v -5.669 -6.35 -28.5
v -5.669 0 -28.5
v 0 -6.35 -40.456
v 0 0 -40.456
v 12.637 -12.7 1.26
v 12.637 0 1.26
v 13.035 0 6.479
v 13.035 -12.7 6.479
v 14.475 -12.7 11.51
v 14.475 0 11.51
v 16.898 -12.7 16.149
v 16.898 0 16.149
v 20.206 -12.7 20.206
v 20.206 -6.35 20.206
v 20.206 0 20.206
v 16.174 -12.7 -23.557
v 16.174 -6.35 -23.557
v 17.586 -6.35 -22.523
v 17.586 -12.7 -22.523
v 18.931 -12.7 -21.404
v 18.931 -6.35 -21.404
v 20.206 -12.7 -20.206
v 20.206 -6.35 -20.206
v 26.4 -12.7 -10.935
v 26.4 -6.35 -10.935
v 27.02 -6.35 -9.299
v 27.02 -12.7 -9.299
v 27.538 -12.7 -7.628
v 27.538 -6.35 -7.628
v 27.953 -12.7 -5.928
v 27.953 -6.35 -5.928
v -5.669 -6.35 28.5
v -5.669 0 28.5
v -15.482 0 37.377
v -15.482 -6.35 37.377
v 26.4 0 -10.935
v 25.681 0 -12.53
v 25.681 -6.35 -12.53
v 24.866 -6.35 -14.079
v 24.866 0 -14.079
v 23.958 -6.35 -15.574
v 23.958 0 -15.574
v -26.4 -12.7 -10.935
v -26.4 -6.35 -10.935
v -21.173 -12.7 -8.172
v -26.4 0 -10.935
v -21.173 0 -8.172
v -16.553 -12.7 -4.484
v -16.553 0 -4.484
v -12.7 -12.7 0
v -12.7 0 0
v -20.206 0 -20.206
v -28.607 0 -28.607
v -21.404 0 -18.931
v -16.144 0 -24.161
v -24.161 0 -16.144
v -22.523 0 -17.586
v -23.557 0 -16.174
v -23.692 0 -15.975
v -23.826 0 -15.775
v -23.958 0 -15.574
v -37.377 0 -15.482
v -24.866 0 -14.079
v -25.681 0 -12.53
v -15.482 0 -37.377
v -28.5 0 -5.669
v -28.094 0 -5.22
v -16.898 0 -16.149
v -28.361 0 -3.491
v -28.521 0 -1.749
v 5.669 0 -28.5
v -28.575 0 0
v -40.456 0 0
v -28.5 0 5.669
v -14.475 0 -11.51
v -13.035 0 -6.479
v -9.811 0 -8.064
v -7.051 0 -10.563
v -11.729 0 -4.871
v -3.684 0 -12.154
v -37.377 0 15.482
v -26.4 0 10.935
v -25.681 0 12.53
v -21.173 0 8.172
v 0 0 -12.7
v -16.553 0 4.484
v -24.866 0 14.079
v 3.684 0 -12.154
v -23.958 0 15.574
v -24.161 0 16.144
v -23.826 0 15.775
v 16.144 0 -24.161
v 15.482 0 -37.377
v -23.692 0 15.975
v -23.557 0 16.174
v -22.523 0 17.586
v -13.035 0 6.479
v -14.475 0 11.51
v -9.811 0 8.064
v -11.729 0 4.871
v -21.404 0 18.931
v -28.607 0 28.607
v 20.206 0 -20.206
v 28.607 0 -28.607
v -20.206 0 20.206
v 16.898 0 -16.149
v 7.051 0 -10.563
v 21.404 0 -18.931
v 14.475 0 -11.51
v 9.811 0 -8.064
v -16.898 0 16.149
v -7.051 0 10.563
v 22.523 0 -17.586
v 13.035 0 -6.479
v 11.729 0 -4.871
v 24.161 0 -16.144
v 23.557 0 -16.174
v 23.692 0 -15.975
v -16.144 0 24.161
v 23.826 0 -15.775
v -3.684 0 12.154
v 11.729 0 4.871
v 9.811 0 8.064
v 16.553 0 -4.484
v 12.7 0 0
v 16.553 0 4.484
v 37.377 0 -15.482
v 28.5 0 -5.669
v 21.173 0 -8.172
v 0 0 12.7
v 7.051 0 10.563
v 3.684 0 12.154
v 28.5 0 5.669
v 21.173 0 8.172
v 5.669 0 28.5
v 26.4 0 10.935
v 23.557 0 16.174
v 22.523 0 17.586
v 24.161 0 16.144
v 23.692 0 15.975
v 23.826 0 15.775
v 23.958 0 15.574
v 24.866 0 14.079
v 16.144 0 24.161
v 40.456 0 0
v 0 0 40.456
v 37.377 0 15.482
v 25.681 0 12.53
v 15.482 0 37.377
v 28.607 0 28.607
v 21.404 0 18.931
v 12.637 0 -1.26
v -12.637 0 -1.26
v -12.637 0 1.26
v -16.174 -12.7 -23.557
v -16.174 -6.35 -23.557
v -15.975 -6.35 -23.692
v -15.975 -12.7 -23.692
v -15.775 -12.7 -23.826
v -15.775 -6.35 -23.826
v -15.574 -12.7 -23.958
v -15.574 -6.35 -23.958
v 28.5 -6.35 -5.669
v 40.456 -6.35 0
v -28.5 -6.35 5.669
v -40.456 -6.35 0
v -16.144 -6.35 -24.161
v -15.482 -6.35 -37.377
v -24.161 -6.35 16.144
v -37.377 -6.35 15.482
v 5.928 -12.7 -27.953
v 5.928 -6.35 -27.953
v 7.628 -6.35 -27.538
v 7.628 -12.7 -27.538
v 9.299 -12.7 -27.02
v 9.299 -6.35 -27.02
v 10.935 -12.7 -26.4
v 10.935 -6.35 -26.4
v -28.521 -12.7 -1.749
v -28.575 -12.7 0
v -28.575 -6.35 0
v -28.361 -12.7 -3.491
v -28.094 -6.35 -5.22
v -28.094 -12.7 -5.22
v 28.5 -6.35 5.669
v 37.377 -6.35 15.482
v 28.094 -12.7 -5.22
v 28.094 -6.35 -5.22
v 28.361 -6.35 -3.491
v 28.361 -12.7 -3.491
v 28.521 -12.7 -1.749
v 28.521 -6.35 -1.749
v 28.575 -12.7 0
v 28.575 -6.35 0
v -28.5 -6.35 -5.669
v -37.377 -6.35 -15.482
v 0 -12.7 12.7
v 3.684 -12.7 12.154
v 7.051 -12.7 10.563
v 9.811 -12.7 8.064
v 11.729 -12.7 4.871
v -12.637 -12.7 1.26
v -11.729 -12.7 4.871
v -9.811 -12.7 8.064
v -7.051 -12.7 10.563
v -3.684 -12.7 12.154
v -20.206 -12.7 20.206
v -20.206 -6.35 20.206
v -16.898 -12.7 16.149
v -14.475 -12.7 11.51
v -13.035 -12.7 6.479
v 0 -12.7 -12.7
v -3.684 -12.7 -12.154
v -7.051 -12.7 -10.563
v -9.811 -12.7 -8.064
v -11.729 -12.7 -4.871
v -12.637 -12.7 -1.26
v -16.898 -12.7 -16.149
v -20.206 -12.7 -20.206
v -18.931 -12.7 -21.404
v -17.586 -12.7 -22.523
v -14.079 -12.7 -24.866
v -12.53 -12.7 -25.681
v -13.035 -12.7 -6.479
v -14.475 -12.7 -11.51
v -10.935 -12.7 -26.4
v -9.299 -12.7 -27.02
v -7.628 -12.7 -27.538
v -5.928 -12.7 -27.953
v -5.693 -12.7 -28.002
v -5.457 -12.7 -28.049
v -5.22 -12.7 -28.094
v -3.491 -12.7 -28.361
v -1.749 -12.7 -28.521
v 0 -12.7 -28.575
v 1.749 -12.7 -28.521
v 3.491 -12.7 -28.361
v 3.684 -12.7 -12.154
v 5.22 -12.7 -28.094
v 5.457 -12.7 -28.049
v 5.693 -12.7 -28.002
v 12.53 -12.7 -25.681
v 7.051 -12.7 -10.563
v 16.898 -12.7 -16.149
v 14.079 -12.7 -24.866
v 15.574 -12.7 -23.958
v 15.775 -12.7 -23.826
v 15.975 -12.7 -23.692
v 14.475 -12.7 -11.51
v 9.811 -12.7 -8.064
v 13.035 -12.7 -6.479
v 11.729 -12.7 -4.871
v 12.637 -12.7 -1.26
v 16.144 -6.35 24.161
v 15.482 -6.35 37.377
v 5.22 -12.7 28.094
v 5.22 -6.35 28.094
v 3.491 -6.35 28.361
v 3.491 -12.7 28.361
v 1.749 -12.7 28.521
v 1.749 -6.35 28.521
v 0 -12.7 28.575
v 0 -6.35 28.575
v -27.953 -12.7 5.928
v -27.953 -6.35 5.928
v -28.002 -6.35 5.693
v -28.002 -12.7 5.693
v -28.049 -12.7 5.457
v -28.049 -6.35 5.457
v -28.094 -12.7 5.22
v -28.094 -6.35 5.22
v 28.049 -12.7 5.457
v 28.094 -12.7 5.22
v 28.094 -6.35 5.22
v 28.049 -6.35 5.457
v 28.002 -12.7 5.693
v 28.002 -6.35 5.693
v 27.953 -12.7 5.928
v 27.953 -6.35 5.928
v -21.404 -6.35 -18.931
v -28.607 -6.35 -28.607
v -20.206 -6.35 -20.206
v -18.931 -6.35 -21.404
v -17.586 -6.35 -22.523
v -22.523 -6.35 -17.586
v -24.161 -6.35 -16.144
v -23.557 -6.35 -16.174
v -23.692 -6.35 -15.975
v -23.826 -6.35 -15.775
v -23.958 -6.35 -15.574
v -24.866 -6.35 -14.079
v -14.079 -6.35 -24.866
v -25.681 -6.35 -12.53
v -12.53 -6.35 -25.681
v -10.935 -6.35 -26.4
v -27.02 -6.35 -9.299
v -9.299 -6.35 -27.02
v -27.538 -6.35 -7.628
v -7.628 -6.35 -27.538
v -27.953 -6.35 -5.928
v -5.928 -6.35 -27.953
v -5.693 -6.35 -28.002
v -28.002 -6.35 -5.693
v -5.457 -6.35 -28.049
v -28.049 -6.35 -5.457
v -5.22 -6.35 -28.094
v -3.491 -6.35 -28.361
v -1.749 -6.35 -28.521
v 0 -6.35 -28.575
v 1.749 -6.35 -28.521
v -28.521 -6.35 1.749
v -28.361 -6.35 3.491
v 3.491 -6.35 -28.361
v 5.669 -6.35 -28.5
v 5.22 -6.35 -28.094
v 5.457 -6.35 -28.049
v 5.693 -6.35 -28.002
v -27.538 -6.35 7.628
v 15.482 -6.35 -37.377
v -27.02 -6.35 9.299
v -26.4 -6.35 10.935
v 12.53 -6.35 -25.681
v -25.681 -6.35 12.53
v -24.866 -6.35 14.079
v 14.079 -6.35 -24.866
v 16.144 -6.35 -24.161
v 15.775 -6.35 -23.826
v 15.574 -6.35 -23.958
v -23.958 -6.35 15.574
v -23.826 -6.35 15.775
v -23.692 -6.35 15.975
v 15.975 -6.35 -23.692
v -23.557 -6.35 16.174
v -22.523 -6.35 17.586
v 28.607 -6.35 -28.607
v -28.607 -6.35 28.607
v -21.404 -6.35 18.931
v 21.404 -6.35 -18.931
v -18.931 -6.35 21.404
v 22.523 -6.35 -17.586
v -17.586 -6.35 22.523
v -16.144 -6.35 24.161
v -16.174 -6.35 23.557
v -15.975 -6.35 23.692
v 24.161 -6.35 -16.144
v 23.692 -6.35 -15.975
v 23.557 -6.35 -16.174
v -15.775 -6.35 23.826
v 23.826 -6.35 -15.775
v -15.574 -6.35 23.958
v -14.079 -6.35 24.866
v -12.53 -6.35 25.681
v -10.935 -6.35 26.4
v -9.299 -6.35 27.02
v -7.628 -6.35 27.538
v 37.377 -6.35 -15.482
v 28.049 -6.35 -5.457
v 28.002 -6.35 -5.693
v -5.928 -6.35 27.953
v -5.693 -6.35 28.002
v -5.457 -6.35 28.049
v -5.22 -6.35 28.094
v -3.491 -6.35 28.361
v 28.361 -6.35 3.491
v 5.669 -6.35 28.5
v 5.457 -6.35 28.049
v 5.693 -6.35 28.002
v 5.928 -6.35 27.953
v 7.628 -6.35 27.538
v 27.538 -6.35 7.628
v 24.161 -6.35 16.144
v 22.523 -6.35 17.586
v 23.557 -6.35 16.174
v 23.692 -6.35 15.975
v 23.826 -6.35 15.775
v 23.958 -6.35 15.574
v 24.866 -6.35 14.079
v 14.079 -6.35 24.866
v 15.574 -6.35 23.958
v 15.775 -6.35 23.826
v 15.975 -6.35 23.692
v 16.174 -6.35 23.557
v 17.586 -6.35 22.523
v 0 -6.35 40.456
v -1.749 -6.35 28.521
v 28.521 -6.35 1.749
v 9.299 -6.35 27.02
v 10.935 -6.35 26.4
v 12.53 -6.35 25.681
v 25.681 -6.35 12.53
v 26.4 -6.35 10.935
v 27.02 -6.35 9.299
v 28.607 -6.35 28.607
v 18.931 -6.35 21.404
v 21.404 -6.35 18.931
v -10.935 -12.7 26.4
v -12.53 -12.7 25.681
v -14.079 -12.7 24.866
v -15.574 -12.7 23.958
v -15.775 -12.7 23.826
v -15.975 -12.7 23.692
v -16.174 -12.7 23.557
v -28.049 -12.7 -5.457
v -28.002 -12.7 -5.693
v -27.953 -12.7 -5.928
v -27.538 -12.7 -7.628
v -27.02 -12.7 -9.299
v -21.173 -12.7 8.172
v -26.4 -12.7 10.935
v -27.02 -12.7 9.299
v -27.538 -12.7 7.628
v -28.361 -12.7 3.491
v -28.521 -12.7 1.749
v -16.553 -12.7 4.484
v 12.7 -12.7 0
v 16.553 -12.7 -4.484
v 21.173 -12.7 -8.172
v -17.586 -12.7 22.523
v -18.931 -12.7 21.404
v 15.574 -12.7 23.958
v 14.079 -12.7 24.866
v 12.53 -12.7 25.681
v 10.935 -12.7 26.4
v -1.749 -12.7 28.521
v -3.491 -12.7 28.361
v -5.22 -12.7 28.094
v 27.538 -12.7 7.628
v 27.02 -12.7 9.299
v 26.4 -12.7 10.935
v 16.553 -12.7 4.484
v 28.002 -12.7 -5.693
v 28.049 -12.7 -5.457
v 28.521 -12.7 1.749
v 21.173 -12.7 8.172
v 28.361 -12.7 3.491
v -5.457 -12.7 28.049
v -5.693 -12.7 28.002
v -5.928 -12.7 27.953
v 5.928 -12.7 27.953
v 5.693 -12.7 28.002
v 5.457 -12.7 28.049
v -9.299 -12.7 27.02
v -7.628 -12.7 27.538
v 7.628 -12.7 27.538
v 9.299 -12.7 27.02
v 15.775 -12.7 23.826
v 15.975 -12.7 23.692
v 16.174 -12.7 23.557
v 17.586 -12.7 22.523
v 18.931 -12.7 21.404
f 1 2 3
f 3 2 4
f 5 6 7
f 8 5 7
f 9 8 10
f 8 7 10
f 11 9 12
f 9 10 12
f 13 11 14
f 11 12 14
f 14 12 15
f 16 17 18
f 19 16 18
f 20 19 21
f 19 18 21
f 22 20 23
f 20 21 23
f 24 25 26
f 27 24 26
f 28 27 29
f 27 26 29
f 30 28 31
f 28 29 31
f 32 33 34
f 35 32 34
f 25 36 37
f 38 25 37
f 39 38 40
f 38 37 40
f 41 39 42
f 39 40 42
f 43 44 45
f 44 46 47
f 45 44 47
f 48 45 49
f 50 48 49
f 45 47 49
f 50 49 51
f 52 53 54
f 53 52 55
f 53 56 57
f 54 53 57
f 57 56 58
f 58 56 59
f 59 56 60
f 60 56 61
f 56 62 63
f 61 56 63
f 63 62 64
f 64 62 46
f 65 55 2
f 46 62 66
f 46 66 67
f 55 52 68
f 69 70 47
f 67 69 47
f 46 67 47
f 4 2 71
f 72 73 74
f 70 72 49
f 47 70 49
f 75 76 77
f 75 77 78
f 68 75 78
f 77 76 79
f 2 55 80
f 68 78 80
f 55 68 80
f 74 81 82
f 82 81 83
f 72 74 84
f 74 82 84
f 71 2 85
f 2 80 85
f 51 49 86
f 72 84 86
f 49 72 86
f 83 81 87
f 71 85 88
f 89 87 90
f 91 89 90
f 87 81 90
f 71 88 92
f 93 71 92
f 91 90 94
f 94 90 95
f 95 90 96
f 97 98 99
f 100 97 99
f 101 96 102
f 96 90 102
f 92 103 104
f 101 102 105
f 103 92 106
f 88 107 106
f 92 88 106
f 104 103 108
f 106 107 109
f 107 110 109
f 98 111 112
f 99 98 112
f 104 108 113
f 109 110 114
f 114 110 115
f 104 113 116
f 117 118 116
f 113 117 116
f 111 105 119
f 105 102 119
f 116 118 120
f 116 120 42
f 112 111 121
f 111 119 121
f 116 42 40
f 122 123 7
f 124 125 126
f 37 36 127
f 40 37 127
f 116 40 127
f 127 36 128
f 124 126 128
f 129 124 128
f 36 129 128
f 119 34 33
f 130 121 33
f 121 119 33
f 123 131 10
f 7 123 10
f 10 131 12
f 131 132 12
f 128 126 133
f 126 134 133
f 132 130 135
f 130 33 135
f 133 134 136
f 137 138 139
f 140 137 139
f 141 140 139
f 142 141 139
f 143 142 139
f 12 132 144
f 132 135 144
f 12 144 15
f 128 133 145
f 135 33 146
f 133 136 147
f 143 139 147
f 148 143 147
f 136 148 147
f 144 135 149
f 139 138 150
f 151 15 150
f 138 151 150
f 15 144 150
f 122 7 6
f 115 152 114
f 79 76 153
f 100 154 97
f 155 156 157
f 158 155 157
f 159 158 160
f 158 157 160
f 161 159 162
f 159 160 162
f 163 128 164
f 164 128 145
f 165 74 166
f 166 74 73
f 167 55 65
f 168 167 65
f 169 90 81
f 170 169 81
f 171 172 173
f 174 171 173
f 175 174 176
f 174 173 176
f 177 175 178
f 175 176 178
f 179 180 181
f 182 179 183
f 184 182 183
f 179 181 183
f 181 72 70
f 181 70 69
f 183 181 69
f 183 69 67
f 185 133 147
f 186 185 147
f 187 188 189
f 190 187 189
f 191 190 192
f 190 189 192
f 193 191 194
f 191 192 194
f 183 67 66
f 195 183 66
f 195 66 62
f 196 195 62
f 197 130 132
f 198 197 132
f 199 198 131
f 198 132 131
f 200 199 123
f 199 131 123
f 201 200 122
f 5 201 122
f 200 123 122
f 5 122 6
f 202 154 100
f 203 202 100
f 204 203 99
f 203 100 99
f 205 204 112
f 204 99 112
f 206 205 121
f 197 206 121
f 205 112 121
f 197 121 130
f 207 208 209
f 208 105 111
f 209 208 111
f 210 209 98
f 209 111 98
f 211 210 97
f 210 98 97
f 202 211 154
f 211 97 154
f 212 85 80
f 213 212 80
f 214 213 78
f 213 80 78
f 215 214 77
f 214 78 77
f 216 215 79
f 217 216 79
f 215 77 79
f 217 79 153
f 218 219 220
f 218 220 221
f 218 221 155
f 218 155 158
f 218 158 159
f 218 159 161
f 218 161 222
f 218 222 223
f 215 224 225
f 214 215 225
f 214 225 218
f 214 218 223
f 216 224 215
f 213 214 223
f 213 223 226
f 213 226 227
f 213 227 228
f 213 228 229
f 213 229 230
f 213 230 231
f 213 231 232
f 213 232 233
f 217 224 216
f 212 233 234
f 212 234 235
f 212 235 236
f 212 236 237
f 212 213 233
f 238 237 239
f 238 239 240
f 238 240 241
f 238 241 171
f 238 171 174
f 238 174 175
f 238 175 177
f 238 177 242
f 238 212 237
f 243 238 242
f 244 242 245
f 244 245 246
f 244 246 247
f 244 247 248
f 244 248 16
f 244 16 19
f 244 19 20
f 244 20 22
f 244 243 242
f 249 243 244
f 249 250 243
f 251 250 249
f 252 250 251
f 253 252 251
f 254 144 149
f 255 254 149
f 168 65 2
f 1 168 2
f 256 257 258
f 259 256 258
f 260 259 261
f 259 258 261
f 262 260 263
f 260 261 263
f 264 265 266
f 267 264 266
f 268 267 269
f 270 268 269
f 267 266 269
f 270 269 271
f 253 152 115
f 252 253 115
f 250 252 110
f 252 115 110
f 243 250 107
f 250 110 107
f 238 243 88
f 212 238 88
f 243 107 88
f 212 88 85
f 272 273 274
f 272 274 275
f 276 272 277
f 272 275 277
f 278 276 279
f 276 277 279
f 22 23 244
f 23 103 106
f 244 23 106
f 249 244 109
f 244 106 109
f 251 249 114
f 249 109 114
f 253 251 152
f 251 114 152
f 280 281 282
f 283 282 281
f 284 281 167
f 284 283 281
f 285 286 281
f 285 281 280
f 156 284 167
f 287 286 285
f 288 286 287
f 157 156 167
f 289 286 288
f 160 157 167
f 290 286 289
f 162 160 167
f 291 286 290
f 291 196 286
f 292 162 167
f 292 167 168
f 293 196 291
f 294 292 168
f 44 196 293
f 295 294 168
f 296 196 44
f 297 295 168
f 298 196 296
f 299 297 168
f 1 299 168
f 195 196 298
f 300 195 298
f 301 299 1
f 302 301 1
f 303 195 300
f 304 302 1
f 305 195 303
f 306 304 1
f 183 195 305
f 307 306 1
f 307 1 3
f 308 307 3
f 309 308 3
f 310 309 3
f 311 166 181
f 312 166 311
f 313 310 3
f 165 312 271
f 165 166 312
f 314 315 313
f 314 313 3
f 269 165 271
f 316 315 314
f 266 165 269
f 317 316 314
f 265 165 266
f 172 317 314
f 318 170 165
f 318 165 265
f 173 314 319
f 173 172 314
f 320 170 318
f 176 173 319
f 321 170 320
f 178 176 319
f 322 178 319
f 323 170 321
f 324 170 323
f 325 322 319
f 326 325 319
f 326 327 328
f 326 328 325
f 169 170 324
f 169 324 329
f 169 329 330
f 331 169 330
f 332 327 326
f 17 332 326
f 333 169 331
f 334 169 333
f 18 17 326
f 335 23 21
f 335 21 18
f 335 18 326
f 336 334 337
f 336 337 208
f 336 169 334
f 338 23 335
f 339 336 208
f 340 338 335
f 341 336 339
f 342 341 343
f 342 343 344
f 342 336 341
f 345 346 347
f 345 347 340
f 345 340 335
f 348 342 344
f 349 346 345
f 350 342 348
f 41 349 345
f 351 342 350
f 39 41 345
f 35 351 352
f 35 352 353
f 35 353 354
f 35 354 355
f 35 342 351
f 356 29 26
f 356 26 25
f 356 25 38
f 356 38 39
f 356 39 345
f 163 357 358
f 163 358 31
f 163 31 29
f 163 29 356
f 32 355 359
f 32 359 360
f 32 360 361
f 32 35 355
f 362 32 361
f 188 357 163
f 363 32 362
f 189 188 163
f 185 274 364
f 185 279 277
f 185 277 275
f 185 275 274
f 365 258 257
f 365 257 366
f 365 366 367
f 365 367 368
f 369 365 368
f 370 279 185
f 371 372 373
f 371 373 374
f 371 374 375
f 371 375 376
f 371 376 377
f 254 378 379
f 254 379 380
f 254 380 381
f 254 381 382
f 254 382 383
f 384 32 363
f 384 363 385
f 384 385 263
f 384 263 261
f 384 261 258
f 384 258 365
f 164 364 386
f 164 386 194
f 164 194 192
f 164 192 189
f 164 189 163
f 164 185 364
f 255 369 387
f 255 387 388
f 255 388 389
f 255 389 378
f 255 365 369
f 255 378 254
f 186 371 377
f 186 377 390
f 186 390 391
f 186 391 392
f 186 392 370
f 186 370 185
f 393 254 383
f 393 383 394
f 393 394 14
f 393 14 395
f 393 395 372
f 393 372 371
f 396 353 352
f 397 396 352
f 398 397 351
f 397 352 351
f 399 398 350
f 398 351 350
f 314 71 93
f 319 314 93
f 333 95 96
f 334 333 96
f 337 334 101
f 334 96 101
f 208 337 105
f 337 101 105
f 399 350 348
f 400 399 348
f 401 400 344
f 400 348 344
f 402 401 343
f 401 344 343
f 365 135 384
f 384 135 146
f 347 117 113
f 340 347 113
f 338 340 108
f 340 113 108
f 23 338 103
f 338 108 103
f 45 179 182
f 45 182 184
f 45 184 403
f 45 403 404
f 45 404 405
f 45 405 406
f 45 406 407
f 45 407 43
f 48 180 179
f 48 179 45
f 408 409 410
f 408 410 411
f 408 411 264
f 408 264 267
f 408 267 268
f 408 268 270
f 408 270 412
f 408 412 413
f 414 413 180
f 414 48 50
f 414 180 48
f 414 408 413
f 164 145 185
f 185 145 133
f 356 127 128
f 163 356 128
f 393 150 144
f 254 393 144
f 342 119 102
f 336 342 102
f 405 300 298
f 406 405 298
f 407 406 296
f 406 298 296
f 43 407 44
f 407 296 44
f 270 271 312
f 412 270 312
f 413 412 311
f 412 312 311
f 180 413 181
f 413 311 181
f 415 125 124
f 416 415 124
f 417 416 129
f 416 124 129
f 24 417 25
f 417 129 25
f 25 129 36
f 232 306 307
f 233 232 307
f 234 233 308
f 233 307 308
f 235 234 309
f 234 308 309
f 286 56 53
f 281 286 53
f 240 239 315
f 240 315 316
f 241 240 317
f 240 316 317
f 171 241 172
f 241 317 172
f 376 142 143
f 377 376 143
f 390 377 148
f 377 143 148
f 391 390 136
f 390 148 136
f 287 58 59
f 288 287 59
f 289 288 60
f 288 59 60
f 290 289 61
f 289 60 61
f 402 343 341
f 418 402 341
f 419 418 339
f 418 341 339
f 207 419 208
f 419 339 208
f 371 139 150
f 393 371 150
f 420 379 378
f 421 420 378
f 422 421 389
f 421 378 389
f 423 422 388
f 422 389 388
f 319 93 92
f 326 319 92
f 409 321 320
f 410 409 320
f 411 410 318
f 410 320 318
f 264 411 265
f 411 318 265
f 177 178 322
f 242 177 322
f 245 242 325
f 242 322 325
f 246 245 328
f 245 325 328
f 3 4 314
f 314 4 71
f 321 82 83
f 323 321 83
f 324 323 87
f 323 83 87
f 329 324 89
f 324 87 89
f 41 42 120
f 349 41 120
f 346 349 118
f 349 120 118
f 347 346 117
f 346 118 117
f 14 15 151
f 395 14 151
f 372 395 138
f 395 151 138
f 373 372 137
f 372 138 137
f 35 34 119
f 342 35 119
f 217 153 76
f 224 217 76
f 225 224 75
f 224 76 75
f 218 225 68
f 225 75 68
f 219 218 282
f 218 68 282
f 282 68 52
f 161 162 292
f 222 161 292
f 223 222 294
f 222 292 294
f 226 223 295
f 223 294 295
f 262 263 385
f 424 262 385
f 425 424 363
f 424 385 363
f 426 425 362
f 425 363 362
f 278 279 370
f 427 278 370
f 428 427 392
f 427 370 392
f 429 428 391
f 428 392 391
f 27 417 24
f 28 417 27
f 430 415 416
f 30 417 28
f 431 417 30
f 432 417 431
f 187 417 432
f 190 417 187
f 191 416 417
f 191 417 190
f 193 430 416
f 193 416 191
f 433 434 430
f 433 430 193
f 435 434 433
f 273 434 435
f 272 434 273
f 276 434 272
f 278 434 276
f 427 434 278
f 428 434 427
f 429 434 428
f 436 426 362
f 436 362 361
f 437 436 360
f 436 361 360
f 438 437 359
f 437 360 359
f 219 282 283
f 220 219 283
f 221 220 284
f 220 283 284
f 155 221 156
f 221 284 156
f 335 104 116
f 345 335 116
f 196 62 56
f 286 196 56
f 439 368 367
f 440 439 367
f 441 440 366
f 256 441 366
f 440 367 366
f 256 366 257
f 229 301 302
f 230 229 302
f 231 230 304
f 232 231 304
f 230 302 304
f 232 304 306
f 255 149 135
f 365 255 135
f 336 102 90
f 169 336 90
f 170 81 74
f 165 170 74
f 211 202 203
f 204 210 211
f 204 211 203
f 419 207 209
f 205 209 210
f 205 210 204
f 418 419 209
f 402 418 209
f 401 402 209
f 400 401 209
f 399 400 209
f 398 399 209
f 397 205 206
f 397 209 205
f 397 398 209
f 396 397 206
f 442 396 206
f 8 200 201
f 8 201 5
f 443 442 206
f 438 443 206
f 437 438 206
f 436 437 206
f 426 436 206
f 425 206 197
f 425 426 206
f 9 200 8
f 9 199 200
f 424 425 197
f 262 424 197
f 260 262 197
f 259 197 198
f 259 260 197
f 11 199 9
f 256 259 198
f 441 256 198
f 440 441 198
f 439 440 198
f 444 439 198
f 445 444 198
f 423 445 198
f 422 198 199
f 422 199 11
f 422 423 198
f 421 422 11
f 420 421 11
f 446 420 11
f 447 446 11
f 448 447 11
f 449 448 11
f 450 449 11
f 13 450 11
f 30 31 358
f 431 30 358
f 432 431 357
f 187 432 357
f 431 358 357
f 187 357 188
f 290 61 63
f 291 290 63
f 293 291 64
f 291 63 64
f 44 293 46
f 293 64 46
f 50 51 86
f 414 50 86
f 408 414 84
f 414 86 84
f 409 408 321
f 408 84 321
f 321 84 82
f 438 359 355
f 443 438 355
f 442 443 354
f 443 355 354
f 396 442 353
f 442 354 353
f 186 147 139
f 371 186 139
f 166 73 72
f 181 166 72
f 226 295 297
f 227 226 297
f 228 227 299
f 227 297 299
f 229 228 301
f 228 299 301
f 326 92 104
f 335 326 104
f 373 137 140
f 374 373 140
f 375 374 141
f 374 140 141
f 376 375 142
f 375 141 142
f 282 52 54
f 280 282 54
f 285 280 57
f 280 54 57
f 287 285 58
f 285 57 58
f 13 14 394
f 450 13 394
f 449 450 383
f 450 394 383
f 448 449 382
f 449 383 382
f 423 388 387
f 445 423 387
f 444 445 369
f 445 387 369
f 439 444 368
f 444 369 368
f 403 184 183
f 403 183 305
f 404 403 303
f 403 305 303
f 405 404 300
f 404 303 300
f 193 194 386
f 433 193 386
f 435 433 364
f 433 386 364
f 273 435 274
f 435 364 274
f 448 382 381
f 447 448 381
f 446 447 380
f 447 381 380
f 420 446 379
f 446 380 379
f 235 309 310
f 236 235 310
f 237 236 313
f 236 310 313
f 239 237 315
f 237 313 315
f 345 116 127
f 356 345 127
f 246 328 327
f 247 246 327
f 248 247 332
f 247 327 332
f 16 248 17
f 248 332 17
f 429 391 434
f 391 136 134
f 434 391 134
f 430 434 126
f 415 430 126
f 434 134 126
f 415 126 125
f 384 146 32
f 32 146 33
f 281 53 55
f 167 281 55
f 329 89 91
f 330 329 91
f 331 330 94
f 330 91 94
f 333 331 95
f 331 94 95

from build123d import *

# Parameters (mm, degrees)
F1_DEPTH = 6.35
F2_DEPTH = 12.7


with BuildPart() as f1:
    # F0 (on Front) → F1 (new body)
    with BuildSketch(Plane.XZ):
        with BuildLine():
            ThreePointArc((28.0940846779, 5.220443574), (28.4545171693, 2.6212740536), (28.575, 0))
            Line((28.575, 0), (40.4561832547, 0))
            Line((40.4561832547, 0), (28.4998200535, 5.6689666767))
            Line((28.4998200535, 5.6689666767), (28.0940846779, 5.220443574))
        make_face()
        with BuildLine():
            ThreePointArc((27.9533270839, 5.9280797851), (28.0259393875, 5.5747059516), (28.0940846779, 5.220443574))
            Line((28.0940846779, 5.220443574), (28.4998200535, 5.6689666767))
            Line((28.4998200535, 5.6689666767), (27.9533270839, 5.9280797851))
        make_face()
        with BuildLine():
            Line((37.3766396726, 15.4819110683), (26.3998576415, 10.9351790798))
            ThreePointArc((26.3998576415, 10.9351790798), (27.2916641722, 8.4673308494), (27.9533270839, 5.9280797851))
            Line((27.9533270839, 5.9280797851), (28.4998200535, 5.6689666767))
            Line((28.4998200535, 5.6689666767), (37.3766396726, 15.4819110683))
        make_face()
        with BuildLine():
            ThreePointArc((23.9577725532, 15.5742017223), (25.2854278682, 13.3108137438), (26.3998576415, 10.9351790798))
            Line((26.3998576415, 10.9351790798), (37.3766396726, 15.4819110683))
            Line((37.3766396726, 15.4819110683), (24.1609808019, 16.143851243))
            Line((24.1609808019, 16.143851243), (23.9577725532, 15.5742017223))
        make_face()
        with BuildLine():
            ThreePointArc((23.556928839, 16.174106735), (23.7592441715, 15.8754194085), (23.9577725532, 15.5742017223))
            Line((23.9577725532, 15.5742017223), (24.1609808019, 16.143851243))
            Line((24.1609808019, 16.143851243), (23.556928839, 16.174106735))
        make_face()
        with BuildLine():
            Line((28.6068415203, 28.6068415203), (20.2055762724, 20.2055762724))
            ThreePointArc((20.2055762724, 20.2055762724), (21.9739027044, 18.2668613871), (23.556928839, 16.174106735))
            Line((23.556928839, 16.174106735), (24.1609808019, 16.143851243))
            Line((24.1609808019, 16.143851243), (28.6068415203, 28.6068415203))
        make_face()
        with BuildLine():
            ThreePointArc((16.174106735, 23.556928839), (18.2668613871, 21.9739027044), (20.2055762724, 20.2055762724))
            Line((20.2055762724, 20.2055762724), (28.6068415203, 28.6068415203))
            Line((28.6068415203, 28.6068415203), (16.143851243, 24.1609808019))
            Line((16.143851243, 24.1609808019), (16.174106735, 23.556928839))
        make_face()
        with BuildLine():
            ThreePointArc((15.5742017223, 23.9577725532), (15.8754194085, 23.7592441715), (16.174106735, 23.556928839))
            Line((16.174106735, 23.556928839), (16.143851243, 24.1609808019))
            Line((16.143851243, 24.1609808019), (15.5742017223, 23.9577725532))
        make_face()
        with BuildLine():
            ThreePointArc((10.9351790798, 26.3998576415), (13.3108137438, 25.2854278682), (15.5742017223, 23.9577725532))
            Line((15.5742017223, 23.9577725532), (16.143851243, 24.1609808019))
            Line((16.143851243, 24.1609808019), (15.4819110683, 37.3766396726))
            Line((15.4819110683, 37.3766396726), (10.9351790798, 26.3998576415))
        make_face()
        with BuildLine():
            Line((5.6689666767, 28.4998200535), (5.9280797851, 27.9533270839))
            ThreePointArc((5.9280797851, 27.9533270839), (8.4673308494, 27.2916641722), (10.9351790798, 26.3998576415))
            Line((10.9351790798, 26.3998576415), (15.4819110683, 37.3766396726))
            Line((15.4819110683, 37.3766396726), (5.6689666767, 28.4998200535))
        make_face()
        with BuildLine():
            Line((5.6689666767, 28.4998200535), (5.220443574, 28.0940846779))
            ThreePointArc((5.220443574, 28.0940846779), (5.5747059516, 28.0259393875), (5.9280797851, 27.9533270839))
            Line((5.9280797851, 27.9533270839), (5.6689666767, 28.4998200535))
        make_face()
        with BuildLine():
            Line((0, 40.4561832547), (0, 28.575))
            ThreePointArc((0, 28.575), (2.6212740536, 28.4545171693), (5.220443574, 28.0940846779))
            Line((5.220443574, 28.0940846779), (5.6689666767, 28.4998200535))
            Line((5.6689666767, 28.4998200535), (0, 40.4561832547))
        make_face()
        with BuildLine():
            ThreePointArc((-5.220443574, 28.0940846779), (-2.6212740536, 28.4545171693), (0, 28.575))
            Line((0, 28.575), (0, 40.4561832547))
            Line((0, 40.4561832547), (-5.6689666767, 28.4998200535))
            Line((-5.6689666767, 28.4998200535), (-5.220443574, 28.0940846779))
        make_face()
        with BuildLine():
            ThreePointArc((-5.9280797851, 27.9533270839), (-5.5747059516, 28.0259393875), (-5.220443574, 28.0940846779))
            Line((-5.220443574, 28.0940846779), (-5.6689666767, 28.4998200535))
            Line((-5.6689666767, 28.4998200535), (-5.9280797851, 27.9533270839))
        make_face()
        with BuildLine():
            ThreePointArc((-10.9351790798, 26.3998576415), (-8.4673308494, 27.2916641722), (-5.9280797851, 27.9533270839))
            Line((-5.9280797851, 27.9533270839), (-5.6689666767, 28.4998200535))
            Line((-5.6689666767, 28.4998200535), (-15.4819110683, 37.3766396726))
            Line((-15.4819110683, 37.3766396726), (-10.9351790798, 26.3998576415))
        make_face()
        with BuildLine():
            Line((-16.143851243, 24.1609808019), (-15.5742017223, 23.9577725532))
            ThreePointArc((-15.5742017223, 23.9577725532), (-13.3108137438, 25.2854278682), (-10.9351790798, 26.3998576415))
            Line((-10.9351790798, 26.3998576415), (-15.4819110683, 37.3766396726))
            Line((-15.4819110683, 37.3766396726), (-16.143851243, 24.1609808019))
        make_face()
        with BuildLine():
            Line((-16.143851243, 24.1609808019), (-16.174106735, 23.556928839))
            ThreePointArc((-16.174106735, 23.556928839), (-15.8754194085, 23.7592441715), (-15.5742017223, 23.9577725532))
            Line((-15.5742017223, 23.9577725532), (-16.143851243, 24.1609808019))
        make_face()
        with BuildLine():
            Line((-28.6068415203, 28.6068415203), (-20.2055762724, 20.2055762724))
            ThreePointArc((-20.2055762724, 20.2055762724), (-18.2668613871, 21.9739027044), (-16.174106735, 23.556928839))
            Line((-16.174106735, 23.556928839), (-16.143851243, 24.1609808019))
            Line((-16.143851243, 24.1609808019), (-28.6068415203, 28.6068415203))
        make_face()
        with BuildLine():
            ThreePointArc((-23.556928839, 16.174106735), (-21.9739027044, 18.2668613871), (-20.2055762724, 20.2055762724))
            Line((-20.2055762724, 20.2055762724), (-28.6068415203, 28.6068415203))
            Line((-28.6068415203, 28.6068415203), (-24.1609808019, 16.143851243))
            Line((-24.1609808019, 16.143851243), (-23.556928839, 16.174106735))
        make_face()
        with BuildLine():
            ThreePointArc((-23.9577725532, 15.5742017223), (-23.7592441715, 15.8754194085), (-23.556928839, 16.174106735))
            Line((-23.556928839, 16.174106735), (-24.1609808019, 16.143851243))
            Line((-24.1609808019, 16.143851243), (-23.9577725532, 15.5742017223))
        make_face()
        with BuildLine():
            Line((-37.3766396726, 15.4819110683), (-26.3998576415, 10.9351790798))
            ThreePointArc((-26.3998576415, 10.9351790798), (-25.2854278682, 13.3108137438), (-23.9577725532, 15.5742017223))
            Line((-23.9577725532, 15.5742017223), (-24.1609808019, 16.143851243))
            Line((-24.1609808019, 16.143851243), (-37.3766396726, 15.4819110683))
        make_face()
        with BuildLine():
            ThreePointArc((-27.9533270839, 5.9280797851), (-27.2916641722, 8.4673308494), (-26.3998576415, 10.9351790798))
            Line((-26.3998576415, 10.9351790798), (-37.3766396726, 15.4819110683))
            Line((-37.3766396726, 15.4819110683), (-28.4998200535, 5.6689666767))
            Line((-28.4998200535, 5.6689666767), (-27.9533270839, 5.9280797851))
        make_face()
        with BuildLine():
            Line((-28.4998200535, 5.6689666767), (-28.0940846779, 5.220443574))
            ThreePointArc((-28.0940846779, 5.220443574), (-28.0259393875, 5.5747059516), (-27.9533270839, 5.9280797851))
            Line((-27.9533270839, 5.9280797851), (-28.4998200535, 5.6689666767))
        make_face()
        with BuildLine():
            Line((-40.4561832547, 0), (-28.575, 0))
            ThreePointArc((-28.575, 0), (-28.4545171693, 2.6212740536), (-28.0940846779, 5.220443574))
            Line((-28.0940846779, 5.220443574), (-28.4998200535, 5.6689666767))
            Line((-28.4998200535, 5.6689666767), (-40.4561832547, 0))
        make_face()
        with BuildLine():
            ThreePointArc((-27.9533270839, -5.9280797851), (-28.0259393875, -5.5747059516), (-28.0940846779, -5.220443574))
            Line((-28.0940846779, -5.220443574), (-28.4998200535, -5.6689666767))
            Line((-28.4998200535, -5.6689666767), (-27.9533270839, -5.9280797851))
        make_face()
        with BuildLine():
            Line((-37.3766396726, -15.4819110683), (-26.3998576415, -10.9351790798))
            ThreePointArc((-26.3998576415, -10.9351790798), (-27.2916641722, -8.4673308494), (-27.9533270839, -5.9280797851))
            Line((-27.9533270839, -5.9280797851), (-28.4998200535, -5.6689666767))
            Line((-28.4998200535, -5.6689666767), (-37.3766396726, -15.4819110683))
        make_face()
        with BuildLine():
            ThreePointArc((-23.9577725532, -15.5742017223), (-25.2854278682, -13.3108137438), (-26.3998576415, -10.9351790798))
            Line((-26.3998576415, -10.9351790798), (-37.3766396726, -15.4819110683))
            Line((-37.3766396726, -15.4819110683), (-24.1609808019, -16.143851243))
            Line((-24.1609808019, -16.143851243), (-23.9577725532, -15.5742017223))
        make_face()
        with BuildLine():
            Line((-24.1609808019, -16.143851243), (-23.556928839, -16.174106735))
            ThreePointArc((-23.556928839, -16.174106735), (-23.7592441715, -15.8754194085), (-23.9577725532, -15.5742017223))
            Line((-23.9577725532, -15.5742017223), (-24.1609808019, -16.143851243))
        make_face()
        with BuildLine():
            Line((-28.6068415203, -28.6068415203), (-20.2055762724, -20.2055762724))
            ThreePointArc((-20.2055762724, -20.2055762724), (-21.9739027044, -18.2668613871), (-23.556928839, -16.174106735))
            Line((-23.556928839, -16.174106735), (-24.1609808019, -16.143851243))
            Line((-24.1609808019, -16.143851243), (-28.6068415203, -28.6068415203))
        make_face()
        with BuildLine():
            ThreePointArc((-16.174106735, -23.556928839), (-18.2668613871, -21.9739027044), (-20.2055762724, -20.2055762724))
            Line((-20.2055762724, -20.2055762724), (-28.6068415203, -28.6068415203))
            Line((-28.6068415203, -28.6068415203), (-16.143851243, -24.1609808019))
            Line((-16.143851243, -24.1609808019), (-16.174106735, -23.556928839))
        make_face()
        with BuildLine():
            ThreePointArc((-15.5742017223, -23.9577725532), (-15.8754194085, -23.7592441715), (-16.174106735, -23.556928839))
            Line((-16.174106735, -23.556928839), (-16.143851243, -24.1609808019))
            Line((-16.143851243, -24.1609808019), (-15.5742017223, -23.9577725532))
        make_face()
        with BuildLine():
            ThreePointArc((-10.9351790798, -26.3998576415), (-13.3108137438, -25.2854278682), (-15.5742017223, -23.9577725532))
            Line((-15.5742017223, -23.9577725532), (-16.143851243, -24.1609808019))
            Line((-16.143851243, -24.1609808019), (-15.4819110683, -37.3766396726))
            Line((-15.4819110683, -37.3766396726), (-10.9351790798, -26.3998576415))
        make_face()
        with BuildLine():
            Line((-5.6689666767, -28.4998200535), (-5.9280797851, -27.9533270839))
            ThreePointArc((-5.9280797851, -27.9533270839), (-8.4673308494, -27.2916641722), (-10.9351790798, -26.3998576415))
            Line((-10.9351790798, -26.3998576415), (-15.4819110683, -37.3766396726))
            Line((-15.4819110683, -37.3766396726), (-5.6689666767, -28.4998200535))
        make_face()
        with BuildLine():
            Line((-5.6689666767, -28.4998200535), (-5.220443574, -28.0940846779))
            ThreePointArc((-5.220443574, -28.0940846779), (-5.5747059516, -28.0259393875), (-5.9280797851, -27.9533270839))
            Line((-5.9280797851, -27.9533270839), (-5.6689666767, -28.4998200535))
        make_face()
        with BuildLine():
            Line((0, -40.4561832547), (0, -28.575))
            ThreePointArc((0, -28.575), (-2.6212740536, -28.4545171693), (-5.220443574, -28.0940846779))
            Line((-5.220443574, -28.0940846779), (-5.6689666767, -28.4998200535))
            Line((-5.6689666767, -28.4998200535), (0, -40.4561832547))
        make_face()
        with BuildLine():
            ThreePointArc((5.220443574, -28.0940846779), (2.6212740536, -28.4545171693), (0, -28.575))
            Line((0, -28.575), (0, -40.4561832547))
            Line((0, -40.4561832547), (5.6689666767, -28.4998200535))
            Line((5.6689666767, -28.4998200535), (5.220443574, -28.0940846779))
        make_face()
        with BuildLine():
            ThreePointArc((5.9280797851, -27.9533270839), (5.5747059516, -28.0259393875), (5.220443574, -28.0940846779))
            Line((5.220443574, -28.0940846779), (5.6689666767, -28.4998200535))
            Line((5.6689666767, -28.4998200535), (5.9280797851, -27.9533270839))
        make_face()
        with BuildLine():
            ThreePointArc((10.9351790798, -26.3998576415), (8.4673308494, -27.2916641722), (5.9280797851, -27.9533270839))
            Line((5.9280797851, -27.9533270839), (5.6689666767, -28.4998200535))
            Line((5.6689666767, -28.4998200535), (15.4819110683, -37.3766396726))
            Line((15.4819110683, -37.3766396726), (10.9351790798, -26.3998576415))
        make_face()
        with BuildLine():
            Line((16.143851243, -24.1609808019), (15.5742017223, -23.9577725532))
            ThreePointArc((15.5742017223, -23.9577725532), (13.3108137438, -25.2854278682), (10.9351790798, -26.3998576415))
            Line((10.9351790798, -26.3998576415), (15.4819110683, -37.3766396726))
            Line((15.4819110683, -37.3766396726), (16.143851243, -24.1609808019))
        make_face()
        with BuildLine():
            Line((16.143851243, -24.1609808019), (16.174106735, -23.556928839))
            ThreePointArc((16.174106735, -23.556928839), (15.8754194085, -23.7592441715), (15.5742017223, -23.9577725532))
            Line((15.5742017223, -23.9577725532), (16.143851243, -24.1609808019))
        make_face()
        with BuildLine():
            Line((28.6068415203, -28.6068415203), (20.2055762724, -20.2055762724))
            ThreePointArc((20.2055762724, -20.2055762724), (18.2668613871, -21.9739027044), (16.174106735, -23.556928839))
            Line((16.174106735, -23.556928839), (16.143851243, -24.1609808019))
            Line((16.143851243, -24.1609808019), (28.6068415203, -28.6068415203))
        make_face()
        with BuildLine():
            ThreePointArc((23.556928839, -16.174106735), (21.9739027044, -18.2668613871), (20.2055762724, -20.2055762724))
            Line((20.2055762724, -20.2055762724), (28.6068415203, -28.6068415203))
            Line((28.6068415203, -28.6068415203), (24.1609808019, -16.143851243))
            Line((24.1609808019, -16.143851243), (23.556928839, -16.174106735))
        make_face()
        with BuildLine():
            Line((24.1609808019, -16.143851243), (23.9577725532, -15.5742017223))
            ThreePointArc((23.9577725532, -15.5742017223), (23.7592441715, -15.8754194085), (23.556928839, -16.174106735))
            Line((23.556928839, -16.174106735), (24.1609808019, -16.143851243))
        make_face()
        with BuildLine():
            Line((37.3766396726, -15.4819110683), (26.3998576415, -10.9351790798))
            ThreePointArc((26.3998576415, -10.9351790798), (25.2854278682, -13.3108137438), (23.9577725532, -15.5742017223))
            Line((23.9577725532, -15.5742017223), (24.1609808019, -16.143851243))
            Line((24.1609808019, -16.143851243), (37.3766396726, -15.4819110683))
        make_face()
        with BuildLine():
            ThreePointArc((27.9533270839, -5.9280797851), (27.2916641722, -8.4673308494), (26.3998576415, -10.9351790798))
            Line((26.3998576415, -10.9351790798), (37.3766396726, -15.4819110683))
            Line((37.3766396726, -15.4819110683), (28.4998200535, -5.6689666767))
            Line((28.4998200535, -5.6689666767), (27.9533270839, -5.9280797851))
        make_face()
        with BuildLine():
            Line((28.4998200535, -5.6689666767), (28.0940846779, -5.220443574))
            ThreePointArc((28.0940846779, -5.220443574), (28.0259393875, -5.5747059516), (27.9533270839, -5.9280797851))
            Line((27.9533270839, -5.9280797851), (28.4998200535, -5.6689666767))
        make_face()
        with BuildLine():
            Line((40.4561832547, 0), (28.575, 0))
            ThreePointArc((28.575, 0), (28.4545171693, -2.6212740536), (28.0940846779, -5.220443574))
            Line((28.0940846779, -5.220443574), (28.4998200535, -5.6689666767))
            Line((28.4998200535, -5.6689666767), (40.4561832547, 0))
        make_face()
    extrude(amount=F1_DEPTH)

    # F0 (on Front) → F2 (join)
    with BuildSketch(Plane.XZ):
        with BuildLine():
            ThreePointArc((-12.637350148, 1.259913186), (-8.5231772989, 9.4151712003), (0, 12.7))
            Line((0, 12.7), (0, 28.575))
            ThreePointArc((0, 28.575), (-2.6212740536, 28.4545171693), (-5.220443574, 28.0940846779))
            ThreePointArc((-5.220443574, 28.0940846779), (-5.5747059516, 28.0259393875), (-5.9280797851, 27.9533270839))
            ThreePointArc((-5.9280797851, 27.9533270839), (-8.4673308494, 27.2916641722), (-10.9351790798, 26.3998576415))
            ThreePointArc((-10.9351790798, 26.3998576415), (-13.3108137438, 25.2854278682), (-15.5742017223, 23.9577725532))
            ThreePointArc((-15.5742017223, 23.9577725532), (-15.8754194085, 23.7592441715), (-16.174106735, 23.556928839))
            ThreePointArc((-16.174106735, 23.556928839), (-18.2668613871, 21.9739027044), (-20.2055762724, 20.2055762724))
            ThreePointArc((-20.2055762724, 20.2055762724), (-14.4748363035, 11.5103639945), (-12.637350148, 1.259913186))
        make_face()
        with BuildLine():
            ThreePointArc((0, 12.7), (8.5231772989, 9.4151712003), (12.637350148, 1.259913186))
            ThreePointArc((12.637350148, 1.259913186), (14.4748363035, 11.5103639945), (20.2055762724, 20.2055762724))
            ThreePointArc((20.2055762724, 20.2055762724), (18.2668613871, 21.9739027044), (16.174106735, 23.556928839))
            ThreePointArc((16.174106735, 23.556928839), (15.8754194085, 23.7592441715), (15.5742017223, 23.9577725532))
            ThreePointArc((15.5742017223, 23.9577725532), (13.3108137438, 25.2854278682), (10.9351790798, 26.3998576415))
            ThreePointArc((10.9351790798, 26.3998576415), (8.4673308494, 27.2916641722), (5.9280797851, 27.9533270839))
            ThreePointArc((5.9280797851, 27.9533270839), (5.5747059516, 28.0259393875), (5.220443574, 28.0940846779))
            ThreePointArc((5.220443574, 28.0940846779), (2.6212740536, 28.4545171693), (0, 28.575))
            Line((0, 28.575), (0, 12.7))
        make_face()
        with BuildLine():
            Line((-28.575, 0), (-12.7, 0))
            ThreePointArc((-12.7, 0), (-18.7768013466, 6.4361823958), (-26.3998576415, 10.9351790798))
            ThreePointArc((-26.3998576415, 10.9351790798), (-27.2916641722, 8.4673308494), (-27.9533270839, 5.9280797851))
            ThreePointArc((-27.9533270839, 5.9280797851), (-28.0259393875, 5.5747059516), (-28.0940846779, 5.220443574))
            ThreePointArc((-28.0940846779, 5.220443574), (-28.4545171693, 2.6212740536), (-28.575, 0))
        make_face()
        with BuildLine():
            ThreePointArc((-26.3998576415, -10.9351790798), (-18.7768013466, -6.4361823958), (-12.7, 0))
            Line((-12.7, 0), (-28.575, 0))
            ThreePointArc((-28.575, 0), (-28.4545171693, -2.6212740536), (-28.0940846779, -5.220443574))
            ThreePointArc((-28.0940846779, -5.220443574), (-28.0259393875, -5.5747059516), (-27.9533270839, -5.9280797851))
            ThreePointArc((-27.9533270839, -5.9280797851), (-27.2916641722, -8.4673308494), (-26.3998576415, -10.9351790798))
        make_face()
        with BuildLine():
            Line((0, -28.575), (0, -12.7))
            ThreePointArc((0, -12.7), (-8.5231772989, -9.4151712003), (-12.637350148, -1.259913186))
            ThreePointArc((-12.637350148, -1.259913186), (-14.4748363035, -11.5103639945), (-20.2055762724, -20.2055762724))
            ThreePointArc((-20.2055762724, -20.2055762724), (-18.2668613871, -21.9739027044), (-16.174106735, -23.556928839))
            ThreePointArc((-16.174106735, -23.556928839), (-15.8754194085, -23.7592441715), (-15.5742017223, -23.9577725532))
            ThreePointArc((-15.5742017223, -23.9577725532), (-13.3108137438, -25.2854278682), (-10.9351790798, -26.3998576415))
            ThreePointArc((-10.9351790798, -26.3998576415), (-8.4673308494, -27.2916641722), (-5.9280797851, -27.9533270839))
            ThreePointArc((-5.9280797851, -27.9533270839), (-5.5747059516, -28.0259393875), (-5.220443574, -28.0940846779))
            ThreePointArc((-5.220443574, -28.0940846779), (-2.6212740536, -28.4545171693), (0, -28.575))
        make_face()
        with BuildLine():
            ThreePointArc((20.2055762724, -20.2055762724), (14.4748363035, -11.5103639945), (12.637350148, -1.259913186))
            ThreePointArc((12.637350148, -1.259913186), (8.5231772989, -9.4151712003), (0, -12.7))
            Line((0, -12.7), (0, -28.575))
            ThreePointArc((0, -28.575), (2.6212740536, -28.4545171693), (5.220443574, -28.0940846779))
            ThreePointArc((5.220443574, -28.0940846779), (5.5747059516, -28.0259393875), (5.9280797851, -27.9533270839))
            ThreePointArc((5.9280797851, -27.9533270839), (8.4673308494, -27.2916641722), (10.9351790798, -26.3998576415))
            ThreePointArc((10.9351790798, -26.3998576415), (13.3108137438, -25.2854278682), (15.5742017223, -23.9577725532))
            ThreePointArc((15.5742017223, -23.9577725532), (15.8754194085, -23.7592441715), (16.174106735, -23.556928839))
            ThreePointArc((16.174106735, -23.556928839), (18.2668613871, -21.9739027044), (20.2055762724, -20.2055762724))
        make_face()
        with BuildLine():
            ThreePointArc((26.3998576415, 10.9351790798), (18.7768013466, 6.4361823958), (12.7, 0))
            Line((12.7, 0), (28.575, 0))
            ThreePointArc((28.575, 0), (28.4545171693, 2.6212740536), (28.0940846779, 5.220443574))
            ThreePointArc((28.0940846779, 5.220443574), (28.0259393875, 5.5747059516), (27.9533270839, 5.9280797851))
            ThreePointArc((27.9533270839, 5.9280797851), (27.2916641722, 8.4673308494), (26.3998576415, 10.9351790798))
        make_face()
        with BuildLine():
            Line((28.575, 0), (12.7, 0))
            ThreePointArc((12.7, 0), (18.7768013466, -6.4361823958), (26.3998576415, -10.9351790798))
            ThreePointArc((26.3998576415, -10.9351790798), (27.2916641722, -8.4673308494), (27.9533270839, -5.9280797851))
            ThreePointArc((27.9533270839, -5.9280797851), (28.0259393875, -5.5747059516), (28.0940846779, -5.220443574))
            ThreePointArc((28.0940846779, -5.220443574), (28.4545171693, -2.6212740536), (28.575, 0))
        make_face()
    extrude(amount=F2_DEPTH)


solid = f1.part
